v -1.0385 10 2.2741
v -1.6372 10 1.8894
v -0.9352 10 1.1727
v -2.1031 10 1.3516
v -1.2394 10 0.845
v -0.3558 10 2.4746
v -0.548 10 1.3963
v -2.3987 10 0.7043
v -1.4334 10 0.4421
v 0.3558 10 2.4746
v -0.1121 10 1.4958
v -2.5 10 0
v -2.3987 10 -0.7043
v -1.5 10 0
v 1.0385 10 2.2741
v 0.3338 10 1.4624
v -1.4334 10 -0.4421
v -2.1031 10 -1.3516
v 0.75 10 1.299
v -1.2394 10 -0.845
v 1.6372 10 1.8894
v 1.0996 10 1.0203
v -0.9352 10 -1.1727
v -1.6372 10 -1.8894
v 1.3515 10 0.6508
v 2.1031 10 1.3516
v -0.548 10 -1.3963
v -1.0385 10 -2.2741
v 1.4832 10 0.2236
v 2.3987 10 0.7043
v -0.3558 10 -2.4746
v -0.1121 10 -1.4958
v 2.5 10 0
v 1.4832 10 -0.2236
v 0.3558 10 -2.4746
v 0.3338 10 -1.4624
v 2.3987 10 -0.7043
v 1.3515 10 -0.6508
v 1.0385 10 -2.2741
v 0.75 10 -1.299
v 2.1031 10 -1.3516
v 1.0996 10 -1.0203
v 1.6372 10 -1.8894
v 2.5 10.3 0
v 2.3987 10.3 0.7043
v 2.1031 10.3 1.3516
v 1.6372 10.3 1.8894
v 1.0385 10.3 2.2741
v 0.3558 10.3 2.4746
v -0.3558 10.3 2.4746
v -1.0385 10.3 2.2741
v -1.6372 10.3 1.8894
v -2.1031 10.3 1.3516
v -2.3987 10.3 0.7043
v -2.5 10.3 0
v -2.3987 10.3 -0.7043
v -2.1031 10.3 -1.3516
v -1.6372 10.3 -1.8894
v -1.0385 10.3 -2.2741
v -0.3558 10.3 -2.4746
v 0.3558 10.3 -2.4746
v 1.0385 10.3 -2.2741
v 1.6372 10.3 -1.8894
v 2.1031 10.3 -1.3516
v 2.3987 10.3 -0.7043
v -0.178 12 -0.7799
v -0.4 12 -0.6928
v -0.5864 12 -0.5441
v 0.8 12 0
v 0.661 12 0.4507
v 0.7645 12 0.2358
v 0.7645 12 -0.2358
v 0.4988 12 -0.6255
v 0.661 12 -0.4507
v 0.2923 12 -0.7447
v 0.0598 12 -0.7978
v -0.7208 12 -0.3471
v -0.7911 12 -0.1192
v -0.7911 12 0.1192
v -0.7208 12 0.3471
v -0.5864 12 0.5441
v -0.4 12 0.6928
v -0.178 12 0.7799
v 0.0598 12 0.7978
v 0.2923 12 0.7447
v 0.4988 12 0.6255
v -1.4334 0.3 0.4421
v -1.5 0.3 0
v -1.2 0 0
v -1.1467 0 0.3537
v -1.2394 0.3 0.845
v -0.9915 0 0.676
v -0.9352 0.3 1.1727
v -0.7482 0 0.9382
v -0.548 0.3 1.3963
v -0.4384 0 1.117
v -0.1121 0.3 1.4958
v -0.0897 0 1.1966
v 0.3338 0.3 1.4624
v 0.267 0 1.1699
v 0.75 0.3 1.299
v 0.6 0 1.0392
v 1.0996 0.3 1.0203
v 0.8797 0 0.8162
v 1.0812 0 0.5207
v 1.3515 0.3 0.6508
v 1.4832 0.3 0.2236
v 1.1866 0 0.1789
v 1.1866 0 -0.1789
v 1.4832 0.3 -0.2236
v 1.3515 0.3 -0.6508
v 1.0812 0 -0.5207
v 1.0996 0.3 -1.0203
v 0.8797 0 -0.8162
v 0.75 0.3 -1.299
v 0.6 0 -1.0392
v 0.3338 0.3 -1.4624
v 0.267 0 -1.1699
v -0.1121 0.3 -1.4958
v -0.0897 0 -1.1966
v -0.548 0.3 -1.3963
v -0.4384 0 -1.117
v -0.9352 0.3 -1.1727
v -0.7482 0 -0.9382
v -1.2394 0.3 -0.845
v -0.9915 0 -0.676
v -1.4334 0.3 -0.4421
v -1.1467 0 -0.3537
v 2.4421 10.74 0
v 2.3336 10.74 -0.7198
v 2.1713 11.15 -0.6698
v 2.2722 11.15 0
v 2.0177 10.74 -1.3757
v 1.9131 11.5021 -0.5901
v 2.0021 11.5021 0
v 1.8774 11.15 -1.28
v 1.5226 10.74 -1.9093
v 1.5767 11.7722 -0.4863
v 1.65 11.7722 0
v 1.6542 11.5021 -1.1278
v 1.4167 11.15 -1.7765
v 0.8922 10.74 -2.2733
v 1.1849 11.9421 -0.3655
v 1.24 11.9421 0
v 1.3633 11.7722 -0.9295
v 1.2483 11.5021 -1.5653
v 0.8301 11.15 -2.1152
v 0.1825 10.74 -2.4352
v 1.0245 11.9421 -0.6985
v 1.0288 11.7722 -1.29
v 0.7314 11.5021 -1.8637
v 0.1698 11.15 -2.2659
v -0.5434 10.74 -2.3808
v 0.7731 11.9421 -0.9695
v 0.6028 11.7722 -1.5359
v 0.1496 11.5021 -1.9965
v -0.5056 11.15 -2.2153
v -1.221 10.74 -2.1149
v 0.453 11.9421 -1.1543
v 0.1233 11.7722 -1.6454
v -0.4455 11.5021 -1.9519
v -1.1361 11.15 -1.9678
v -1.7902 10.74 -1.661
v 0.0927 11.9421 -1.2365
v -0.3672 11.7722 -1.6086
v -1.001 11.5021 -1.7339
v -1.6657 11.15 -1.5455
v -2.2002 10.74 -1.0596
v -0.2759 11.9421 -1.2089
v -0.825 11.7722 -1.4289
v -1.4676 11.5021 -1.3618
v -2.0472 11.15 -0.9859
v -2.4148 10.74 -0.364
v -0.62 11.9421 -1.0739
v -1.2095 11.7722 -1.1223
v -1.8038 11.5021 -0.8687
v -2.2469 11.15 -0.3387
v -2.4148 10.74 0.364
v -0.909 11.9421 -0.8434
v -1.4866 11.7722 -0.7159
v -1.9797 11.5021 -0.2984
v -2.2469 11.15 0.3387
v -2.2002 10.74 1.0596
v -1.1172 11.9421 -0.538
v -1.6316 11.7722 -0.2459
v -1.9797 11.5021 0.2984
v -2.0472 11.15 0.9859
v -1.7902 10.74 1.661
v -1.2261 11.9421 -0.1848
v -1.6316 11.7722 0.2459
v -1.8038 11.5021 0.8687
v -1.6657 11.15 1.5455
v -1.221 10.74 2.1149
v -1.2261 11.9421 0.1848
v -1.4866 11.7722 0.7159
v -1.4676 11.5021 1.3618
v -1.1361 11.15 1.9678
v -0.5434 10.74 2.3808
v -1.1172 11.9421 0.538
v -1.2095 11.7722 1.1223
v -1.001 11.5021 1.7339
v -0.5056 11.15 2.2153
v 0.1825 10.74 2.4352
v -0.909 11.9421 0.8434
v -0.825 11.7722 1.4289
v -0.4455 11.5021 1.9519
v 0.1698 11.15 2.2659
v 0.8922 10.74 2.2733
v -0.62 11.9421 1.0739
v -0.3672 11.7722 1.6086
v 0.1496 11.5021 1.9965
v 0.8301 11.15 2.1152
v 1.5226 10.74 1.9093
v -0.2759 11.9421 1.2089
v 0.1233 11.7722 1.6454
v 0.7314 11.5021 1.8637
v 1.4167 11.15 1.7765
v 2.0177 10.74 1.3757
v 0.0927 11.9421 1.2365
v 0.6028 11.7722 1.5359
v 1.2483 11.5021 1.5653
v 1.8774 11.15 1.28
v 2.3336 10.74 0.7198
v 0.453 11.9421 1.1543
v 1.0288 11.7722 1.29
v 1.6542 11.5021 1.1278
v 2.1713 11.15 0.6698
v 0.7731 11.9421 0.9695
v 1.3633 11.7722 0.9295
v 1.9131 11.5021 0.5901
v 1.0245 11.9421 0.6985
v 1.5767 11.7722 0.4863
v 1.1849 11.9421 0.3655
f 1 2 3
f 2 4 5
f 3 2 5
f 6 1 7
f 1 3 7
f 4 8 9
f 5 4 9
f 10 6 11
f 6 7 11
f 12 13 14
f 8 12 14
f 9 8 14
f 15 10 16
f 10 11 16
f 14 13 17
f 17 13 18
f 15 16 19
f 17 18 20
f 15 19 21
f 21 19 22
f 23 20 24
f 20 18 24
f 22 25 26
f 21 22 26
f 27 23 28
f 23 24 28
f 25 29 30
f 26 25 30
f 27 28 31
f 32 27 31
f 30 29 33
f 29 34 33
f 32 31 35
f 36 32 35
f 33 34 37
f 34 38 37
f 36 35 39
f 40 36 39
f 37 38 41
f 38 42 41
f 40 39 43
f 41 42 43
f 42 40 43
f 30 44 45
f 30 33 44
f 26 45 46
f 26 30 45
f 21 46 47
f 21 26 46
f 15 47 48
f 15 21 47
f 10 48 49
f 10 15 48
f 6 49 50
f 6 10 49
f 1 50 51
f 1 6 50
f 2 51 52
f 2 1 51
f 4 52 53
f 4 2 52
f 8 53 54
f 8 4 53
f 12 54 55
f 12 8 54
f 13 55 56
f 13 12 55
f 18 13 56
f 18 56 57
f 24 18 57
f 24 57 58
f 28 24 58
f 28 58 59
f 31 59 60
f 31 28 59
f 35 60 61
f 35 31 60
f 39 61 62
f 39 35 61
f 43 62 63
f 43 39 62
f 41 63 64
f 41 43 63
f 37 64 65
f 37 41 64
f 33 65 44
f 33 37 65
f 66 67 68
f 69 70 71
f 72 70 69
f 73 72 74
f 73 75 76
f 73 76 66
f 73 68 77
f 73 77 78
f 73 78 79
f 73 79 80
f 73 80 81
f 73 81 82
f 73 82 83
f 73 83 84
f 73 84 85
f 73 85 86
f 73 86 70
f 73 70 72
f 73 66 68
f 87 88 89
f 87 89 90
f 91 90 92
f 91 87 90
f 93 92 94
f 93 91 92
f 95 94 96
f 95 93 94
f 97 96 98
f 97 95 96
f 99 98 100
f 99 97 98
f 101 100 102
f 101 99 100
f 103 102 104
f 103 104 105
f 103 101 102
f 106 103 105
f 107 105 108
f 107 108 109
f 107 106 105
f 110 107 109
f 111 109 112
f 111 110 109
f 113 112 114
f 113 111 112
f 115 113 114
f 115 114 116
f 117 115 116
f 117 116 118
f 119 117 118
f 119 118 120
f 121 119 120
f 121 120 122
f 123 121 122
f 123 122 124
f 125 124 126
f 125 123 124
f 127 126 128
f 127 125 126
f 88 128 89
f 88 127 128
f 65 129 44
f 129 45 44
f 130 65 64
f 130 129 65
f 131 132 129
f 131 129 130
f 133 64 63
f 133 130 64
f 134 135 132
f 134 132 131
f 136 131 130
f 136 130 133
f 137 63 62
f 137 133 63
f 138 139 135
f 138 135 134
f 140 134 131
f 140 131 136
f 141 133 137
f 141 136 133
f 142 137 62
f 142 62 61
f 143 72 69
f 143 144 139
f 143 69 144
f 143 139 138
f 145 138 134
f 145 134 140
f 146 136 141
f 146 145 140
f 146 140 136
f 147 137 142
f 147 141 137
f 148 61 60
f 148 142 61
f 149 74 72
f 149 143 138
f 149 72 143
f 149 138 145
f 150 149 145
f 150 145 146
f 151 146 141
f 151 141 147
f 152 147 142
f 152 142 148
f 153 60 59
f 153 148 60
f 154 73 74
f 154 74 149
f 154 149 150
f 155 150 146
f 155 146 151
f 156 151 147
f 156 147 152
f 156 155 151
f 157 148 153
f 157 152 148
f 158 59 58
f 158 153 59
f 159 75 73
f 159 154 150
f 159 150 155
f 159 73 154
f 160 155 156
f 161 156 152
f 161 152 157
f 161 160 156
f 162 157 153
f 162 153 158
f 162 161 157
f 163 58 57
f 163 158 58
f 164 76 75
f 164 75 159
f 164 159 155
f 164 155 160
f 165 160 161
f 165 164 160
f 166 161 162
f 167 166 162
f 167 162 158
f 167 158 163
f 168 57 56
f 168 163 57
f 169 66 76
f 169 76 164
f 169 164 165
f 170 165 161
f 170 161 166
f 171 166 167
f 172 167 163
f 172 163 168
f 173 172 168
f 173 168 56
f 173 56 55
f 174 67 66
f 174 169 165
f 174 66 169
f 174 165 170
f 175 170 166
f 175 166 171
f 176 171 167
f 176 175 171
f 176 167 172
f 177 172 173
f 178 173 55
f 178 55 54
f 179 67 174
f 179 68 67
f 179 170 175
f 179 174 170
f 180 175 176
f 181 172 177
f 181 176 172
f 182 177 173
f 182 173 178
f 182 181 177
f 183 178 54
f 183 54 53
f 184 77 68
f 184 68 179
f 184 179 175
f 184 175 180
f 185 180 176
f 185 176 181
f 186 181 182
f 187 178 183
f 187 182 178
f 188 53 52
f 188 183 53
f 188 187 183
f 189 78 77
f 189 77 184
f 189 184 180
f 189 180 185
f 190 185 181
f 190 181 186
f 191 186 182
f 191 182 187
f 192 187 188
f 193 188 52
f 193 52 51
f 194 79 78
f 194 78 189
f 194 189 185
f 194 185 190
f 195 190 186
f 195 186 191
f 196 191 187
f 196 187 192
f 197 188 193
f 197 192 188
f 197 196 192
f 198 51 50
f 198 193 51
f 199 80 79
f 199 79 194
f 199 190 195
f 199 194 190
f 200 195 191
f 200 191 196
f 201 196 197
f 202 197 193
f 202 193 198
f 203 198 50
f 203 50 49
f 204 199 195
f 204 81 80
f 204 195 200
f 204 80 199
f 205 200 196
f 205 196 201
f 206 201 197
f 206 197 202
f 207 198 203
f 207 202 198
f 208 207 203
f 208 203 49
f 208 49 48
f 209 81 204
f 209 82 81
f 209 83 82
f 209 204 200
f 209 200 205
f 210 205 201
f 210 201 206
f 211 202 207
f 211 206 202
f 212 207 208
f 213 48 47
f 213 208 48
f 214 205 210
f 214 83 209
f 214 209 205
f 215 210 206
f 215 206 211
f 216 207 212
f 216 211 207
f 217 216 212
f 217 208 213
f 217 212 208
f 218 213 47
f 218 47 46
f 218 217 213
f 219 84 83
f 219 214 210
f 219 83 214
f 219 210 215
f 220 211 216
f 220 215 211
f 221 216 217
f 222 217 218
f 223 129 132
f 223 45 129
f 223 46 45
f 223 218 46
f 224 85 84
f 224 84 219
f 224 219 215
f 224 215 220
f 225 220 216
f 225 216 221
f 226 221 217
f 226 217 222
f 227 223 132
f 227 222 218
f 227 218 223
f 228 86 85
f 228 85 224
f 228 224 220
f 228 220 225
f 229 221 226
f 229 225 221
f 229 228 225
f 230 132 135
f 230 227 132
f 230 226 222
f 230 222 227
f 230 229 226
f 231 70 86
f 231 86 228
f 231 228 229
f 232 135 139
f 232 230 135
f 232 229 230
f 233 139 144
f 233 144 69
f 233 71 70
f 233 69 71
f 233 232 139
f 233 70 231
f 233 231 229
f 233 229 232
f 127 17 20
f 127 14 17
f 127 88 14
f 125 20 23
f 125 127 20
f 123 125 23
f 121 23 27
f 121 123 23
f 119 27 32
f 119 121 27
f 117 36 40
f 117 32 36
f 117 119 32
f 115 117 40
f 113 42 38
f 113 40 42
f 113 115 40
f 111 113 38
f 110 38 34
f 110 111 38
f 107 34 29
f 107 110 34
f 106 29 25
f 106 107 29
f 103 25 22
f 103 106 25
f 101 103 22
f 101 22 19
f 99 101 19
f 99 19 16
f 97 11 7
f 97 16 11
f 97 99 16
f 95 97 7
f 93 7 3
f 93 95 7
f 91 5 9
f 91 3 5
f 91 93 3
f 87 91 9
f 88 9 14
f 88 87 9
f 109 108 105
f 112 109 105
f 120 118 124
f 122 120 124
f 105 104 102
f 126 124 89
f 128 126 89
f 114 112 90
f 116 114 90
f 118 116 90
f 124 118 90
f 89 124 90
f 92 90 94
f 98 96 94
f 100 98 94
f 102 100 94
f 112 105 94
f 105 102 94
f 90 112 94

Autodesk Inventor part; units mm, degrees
ref_plane "YZ Plane" through (0, 0, 0) normal (1, 0, 0) x (0, 1, 0)
ref_plane "XZ Plane" through (0, 0, 0) normal (0, 1, 0) x (-1, 0, 0)
ref_plane "XY Plane" through (0, 0, 0) normal (0, 0, 1) x (1, 0, 0)
sketch "Sketch1" plane through (0, 0, 0) normal (0, 1, 0) x (-1, 0, 0)
  circle A0 centre (0, 0) radius 1.5
  dimension "d0" = 3
extrude "Extrusion1" add sketch "Sketch1" along normal blind 10
sketch "Sketch2" plane through (0, 10, 0) normal (0, 1, 0) x (1, 0, 0)
  circle A0 centre (0, 0) radius 2.5
  dimension "d3" = 5
extrude "Extrusion2" add sketch "Sketch2" along normal blind 2
fillet "Fillet1" radius 1.7 1 edges at (-2.5, 12, 0)
chamfer "Chamfer1" distance 0.3 angle 45 1 edges at (1.5, 0, 0)
thread "Thread1" size "M3x0.5" class "6g" standard "ANSI Metric M Profile" full length
properties part number "M3x10 Screw Steel" material "Stainless Steel"
